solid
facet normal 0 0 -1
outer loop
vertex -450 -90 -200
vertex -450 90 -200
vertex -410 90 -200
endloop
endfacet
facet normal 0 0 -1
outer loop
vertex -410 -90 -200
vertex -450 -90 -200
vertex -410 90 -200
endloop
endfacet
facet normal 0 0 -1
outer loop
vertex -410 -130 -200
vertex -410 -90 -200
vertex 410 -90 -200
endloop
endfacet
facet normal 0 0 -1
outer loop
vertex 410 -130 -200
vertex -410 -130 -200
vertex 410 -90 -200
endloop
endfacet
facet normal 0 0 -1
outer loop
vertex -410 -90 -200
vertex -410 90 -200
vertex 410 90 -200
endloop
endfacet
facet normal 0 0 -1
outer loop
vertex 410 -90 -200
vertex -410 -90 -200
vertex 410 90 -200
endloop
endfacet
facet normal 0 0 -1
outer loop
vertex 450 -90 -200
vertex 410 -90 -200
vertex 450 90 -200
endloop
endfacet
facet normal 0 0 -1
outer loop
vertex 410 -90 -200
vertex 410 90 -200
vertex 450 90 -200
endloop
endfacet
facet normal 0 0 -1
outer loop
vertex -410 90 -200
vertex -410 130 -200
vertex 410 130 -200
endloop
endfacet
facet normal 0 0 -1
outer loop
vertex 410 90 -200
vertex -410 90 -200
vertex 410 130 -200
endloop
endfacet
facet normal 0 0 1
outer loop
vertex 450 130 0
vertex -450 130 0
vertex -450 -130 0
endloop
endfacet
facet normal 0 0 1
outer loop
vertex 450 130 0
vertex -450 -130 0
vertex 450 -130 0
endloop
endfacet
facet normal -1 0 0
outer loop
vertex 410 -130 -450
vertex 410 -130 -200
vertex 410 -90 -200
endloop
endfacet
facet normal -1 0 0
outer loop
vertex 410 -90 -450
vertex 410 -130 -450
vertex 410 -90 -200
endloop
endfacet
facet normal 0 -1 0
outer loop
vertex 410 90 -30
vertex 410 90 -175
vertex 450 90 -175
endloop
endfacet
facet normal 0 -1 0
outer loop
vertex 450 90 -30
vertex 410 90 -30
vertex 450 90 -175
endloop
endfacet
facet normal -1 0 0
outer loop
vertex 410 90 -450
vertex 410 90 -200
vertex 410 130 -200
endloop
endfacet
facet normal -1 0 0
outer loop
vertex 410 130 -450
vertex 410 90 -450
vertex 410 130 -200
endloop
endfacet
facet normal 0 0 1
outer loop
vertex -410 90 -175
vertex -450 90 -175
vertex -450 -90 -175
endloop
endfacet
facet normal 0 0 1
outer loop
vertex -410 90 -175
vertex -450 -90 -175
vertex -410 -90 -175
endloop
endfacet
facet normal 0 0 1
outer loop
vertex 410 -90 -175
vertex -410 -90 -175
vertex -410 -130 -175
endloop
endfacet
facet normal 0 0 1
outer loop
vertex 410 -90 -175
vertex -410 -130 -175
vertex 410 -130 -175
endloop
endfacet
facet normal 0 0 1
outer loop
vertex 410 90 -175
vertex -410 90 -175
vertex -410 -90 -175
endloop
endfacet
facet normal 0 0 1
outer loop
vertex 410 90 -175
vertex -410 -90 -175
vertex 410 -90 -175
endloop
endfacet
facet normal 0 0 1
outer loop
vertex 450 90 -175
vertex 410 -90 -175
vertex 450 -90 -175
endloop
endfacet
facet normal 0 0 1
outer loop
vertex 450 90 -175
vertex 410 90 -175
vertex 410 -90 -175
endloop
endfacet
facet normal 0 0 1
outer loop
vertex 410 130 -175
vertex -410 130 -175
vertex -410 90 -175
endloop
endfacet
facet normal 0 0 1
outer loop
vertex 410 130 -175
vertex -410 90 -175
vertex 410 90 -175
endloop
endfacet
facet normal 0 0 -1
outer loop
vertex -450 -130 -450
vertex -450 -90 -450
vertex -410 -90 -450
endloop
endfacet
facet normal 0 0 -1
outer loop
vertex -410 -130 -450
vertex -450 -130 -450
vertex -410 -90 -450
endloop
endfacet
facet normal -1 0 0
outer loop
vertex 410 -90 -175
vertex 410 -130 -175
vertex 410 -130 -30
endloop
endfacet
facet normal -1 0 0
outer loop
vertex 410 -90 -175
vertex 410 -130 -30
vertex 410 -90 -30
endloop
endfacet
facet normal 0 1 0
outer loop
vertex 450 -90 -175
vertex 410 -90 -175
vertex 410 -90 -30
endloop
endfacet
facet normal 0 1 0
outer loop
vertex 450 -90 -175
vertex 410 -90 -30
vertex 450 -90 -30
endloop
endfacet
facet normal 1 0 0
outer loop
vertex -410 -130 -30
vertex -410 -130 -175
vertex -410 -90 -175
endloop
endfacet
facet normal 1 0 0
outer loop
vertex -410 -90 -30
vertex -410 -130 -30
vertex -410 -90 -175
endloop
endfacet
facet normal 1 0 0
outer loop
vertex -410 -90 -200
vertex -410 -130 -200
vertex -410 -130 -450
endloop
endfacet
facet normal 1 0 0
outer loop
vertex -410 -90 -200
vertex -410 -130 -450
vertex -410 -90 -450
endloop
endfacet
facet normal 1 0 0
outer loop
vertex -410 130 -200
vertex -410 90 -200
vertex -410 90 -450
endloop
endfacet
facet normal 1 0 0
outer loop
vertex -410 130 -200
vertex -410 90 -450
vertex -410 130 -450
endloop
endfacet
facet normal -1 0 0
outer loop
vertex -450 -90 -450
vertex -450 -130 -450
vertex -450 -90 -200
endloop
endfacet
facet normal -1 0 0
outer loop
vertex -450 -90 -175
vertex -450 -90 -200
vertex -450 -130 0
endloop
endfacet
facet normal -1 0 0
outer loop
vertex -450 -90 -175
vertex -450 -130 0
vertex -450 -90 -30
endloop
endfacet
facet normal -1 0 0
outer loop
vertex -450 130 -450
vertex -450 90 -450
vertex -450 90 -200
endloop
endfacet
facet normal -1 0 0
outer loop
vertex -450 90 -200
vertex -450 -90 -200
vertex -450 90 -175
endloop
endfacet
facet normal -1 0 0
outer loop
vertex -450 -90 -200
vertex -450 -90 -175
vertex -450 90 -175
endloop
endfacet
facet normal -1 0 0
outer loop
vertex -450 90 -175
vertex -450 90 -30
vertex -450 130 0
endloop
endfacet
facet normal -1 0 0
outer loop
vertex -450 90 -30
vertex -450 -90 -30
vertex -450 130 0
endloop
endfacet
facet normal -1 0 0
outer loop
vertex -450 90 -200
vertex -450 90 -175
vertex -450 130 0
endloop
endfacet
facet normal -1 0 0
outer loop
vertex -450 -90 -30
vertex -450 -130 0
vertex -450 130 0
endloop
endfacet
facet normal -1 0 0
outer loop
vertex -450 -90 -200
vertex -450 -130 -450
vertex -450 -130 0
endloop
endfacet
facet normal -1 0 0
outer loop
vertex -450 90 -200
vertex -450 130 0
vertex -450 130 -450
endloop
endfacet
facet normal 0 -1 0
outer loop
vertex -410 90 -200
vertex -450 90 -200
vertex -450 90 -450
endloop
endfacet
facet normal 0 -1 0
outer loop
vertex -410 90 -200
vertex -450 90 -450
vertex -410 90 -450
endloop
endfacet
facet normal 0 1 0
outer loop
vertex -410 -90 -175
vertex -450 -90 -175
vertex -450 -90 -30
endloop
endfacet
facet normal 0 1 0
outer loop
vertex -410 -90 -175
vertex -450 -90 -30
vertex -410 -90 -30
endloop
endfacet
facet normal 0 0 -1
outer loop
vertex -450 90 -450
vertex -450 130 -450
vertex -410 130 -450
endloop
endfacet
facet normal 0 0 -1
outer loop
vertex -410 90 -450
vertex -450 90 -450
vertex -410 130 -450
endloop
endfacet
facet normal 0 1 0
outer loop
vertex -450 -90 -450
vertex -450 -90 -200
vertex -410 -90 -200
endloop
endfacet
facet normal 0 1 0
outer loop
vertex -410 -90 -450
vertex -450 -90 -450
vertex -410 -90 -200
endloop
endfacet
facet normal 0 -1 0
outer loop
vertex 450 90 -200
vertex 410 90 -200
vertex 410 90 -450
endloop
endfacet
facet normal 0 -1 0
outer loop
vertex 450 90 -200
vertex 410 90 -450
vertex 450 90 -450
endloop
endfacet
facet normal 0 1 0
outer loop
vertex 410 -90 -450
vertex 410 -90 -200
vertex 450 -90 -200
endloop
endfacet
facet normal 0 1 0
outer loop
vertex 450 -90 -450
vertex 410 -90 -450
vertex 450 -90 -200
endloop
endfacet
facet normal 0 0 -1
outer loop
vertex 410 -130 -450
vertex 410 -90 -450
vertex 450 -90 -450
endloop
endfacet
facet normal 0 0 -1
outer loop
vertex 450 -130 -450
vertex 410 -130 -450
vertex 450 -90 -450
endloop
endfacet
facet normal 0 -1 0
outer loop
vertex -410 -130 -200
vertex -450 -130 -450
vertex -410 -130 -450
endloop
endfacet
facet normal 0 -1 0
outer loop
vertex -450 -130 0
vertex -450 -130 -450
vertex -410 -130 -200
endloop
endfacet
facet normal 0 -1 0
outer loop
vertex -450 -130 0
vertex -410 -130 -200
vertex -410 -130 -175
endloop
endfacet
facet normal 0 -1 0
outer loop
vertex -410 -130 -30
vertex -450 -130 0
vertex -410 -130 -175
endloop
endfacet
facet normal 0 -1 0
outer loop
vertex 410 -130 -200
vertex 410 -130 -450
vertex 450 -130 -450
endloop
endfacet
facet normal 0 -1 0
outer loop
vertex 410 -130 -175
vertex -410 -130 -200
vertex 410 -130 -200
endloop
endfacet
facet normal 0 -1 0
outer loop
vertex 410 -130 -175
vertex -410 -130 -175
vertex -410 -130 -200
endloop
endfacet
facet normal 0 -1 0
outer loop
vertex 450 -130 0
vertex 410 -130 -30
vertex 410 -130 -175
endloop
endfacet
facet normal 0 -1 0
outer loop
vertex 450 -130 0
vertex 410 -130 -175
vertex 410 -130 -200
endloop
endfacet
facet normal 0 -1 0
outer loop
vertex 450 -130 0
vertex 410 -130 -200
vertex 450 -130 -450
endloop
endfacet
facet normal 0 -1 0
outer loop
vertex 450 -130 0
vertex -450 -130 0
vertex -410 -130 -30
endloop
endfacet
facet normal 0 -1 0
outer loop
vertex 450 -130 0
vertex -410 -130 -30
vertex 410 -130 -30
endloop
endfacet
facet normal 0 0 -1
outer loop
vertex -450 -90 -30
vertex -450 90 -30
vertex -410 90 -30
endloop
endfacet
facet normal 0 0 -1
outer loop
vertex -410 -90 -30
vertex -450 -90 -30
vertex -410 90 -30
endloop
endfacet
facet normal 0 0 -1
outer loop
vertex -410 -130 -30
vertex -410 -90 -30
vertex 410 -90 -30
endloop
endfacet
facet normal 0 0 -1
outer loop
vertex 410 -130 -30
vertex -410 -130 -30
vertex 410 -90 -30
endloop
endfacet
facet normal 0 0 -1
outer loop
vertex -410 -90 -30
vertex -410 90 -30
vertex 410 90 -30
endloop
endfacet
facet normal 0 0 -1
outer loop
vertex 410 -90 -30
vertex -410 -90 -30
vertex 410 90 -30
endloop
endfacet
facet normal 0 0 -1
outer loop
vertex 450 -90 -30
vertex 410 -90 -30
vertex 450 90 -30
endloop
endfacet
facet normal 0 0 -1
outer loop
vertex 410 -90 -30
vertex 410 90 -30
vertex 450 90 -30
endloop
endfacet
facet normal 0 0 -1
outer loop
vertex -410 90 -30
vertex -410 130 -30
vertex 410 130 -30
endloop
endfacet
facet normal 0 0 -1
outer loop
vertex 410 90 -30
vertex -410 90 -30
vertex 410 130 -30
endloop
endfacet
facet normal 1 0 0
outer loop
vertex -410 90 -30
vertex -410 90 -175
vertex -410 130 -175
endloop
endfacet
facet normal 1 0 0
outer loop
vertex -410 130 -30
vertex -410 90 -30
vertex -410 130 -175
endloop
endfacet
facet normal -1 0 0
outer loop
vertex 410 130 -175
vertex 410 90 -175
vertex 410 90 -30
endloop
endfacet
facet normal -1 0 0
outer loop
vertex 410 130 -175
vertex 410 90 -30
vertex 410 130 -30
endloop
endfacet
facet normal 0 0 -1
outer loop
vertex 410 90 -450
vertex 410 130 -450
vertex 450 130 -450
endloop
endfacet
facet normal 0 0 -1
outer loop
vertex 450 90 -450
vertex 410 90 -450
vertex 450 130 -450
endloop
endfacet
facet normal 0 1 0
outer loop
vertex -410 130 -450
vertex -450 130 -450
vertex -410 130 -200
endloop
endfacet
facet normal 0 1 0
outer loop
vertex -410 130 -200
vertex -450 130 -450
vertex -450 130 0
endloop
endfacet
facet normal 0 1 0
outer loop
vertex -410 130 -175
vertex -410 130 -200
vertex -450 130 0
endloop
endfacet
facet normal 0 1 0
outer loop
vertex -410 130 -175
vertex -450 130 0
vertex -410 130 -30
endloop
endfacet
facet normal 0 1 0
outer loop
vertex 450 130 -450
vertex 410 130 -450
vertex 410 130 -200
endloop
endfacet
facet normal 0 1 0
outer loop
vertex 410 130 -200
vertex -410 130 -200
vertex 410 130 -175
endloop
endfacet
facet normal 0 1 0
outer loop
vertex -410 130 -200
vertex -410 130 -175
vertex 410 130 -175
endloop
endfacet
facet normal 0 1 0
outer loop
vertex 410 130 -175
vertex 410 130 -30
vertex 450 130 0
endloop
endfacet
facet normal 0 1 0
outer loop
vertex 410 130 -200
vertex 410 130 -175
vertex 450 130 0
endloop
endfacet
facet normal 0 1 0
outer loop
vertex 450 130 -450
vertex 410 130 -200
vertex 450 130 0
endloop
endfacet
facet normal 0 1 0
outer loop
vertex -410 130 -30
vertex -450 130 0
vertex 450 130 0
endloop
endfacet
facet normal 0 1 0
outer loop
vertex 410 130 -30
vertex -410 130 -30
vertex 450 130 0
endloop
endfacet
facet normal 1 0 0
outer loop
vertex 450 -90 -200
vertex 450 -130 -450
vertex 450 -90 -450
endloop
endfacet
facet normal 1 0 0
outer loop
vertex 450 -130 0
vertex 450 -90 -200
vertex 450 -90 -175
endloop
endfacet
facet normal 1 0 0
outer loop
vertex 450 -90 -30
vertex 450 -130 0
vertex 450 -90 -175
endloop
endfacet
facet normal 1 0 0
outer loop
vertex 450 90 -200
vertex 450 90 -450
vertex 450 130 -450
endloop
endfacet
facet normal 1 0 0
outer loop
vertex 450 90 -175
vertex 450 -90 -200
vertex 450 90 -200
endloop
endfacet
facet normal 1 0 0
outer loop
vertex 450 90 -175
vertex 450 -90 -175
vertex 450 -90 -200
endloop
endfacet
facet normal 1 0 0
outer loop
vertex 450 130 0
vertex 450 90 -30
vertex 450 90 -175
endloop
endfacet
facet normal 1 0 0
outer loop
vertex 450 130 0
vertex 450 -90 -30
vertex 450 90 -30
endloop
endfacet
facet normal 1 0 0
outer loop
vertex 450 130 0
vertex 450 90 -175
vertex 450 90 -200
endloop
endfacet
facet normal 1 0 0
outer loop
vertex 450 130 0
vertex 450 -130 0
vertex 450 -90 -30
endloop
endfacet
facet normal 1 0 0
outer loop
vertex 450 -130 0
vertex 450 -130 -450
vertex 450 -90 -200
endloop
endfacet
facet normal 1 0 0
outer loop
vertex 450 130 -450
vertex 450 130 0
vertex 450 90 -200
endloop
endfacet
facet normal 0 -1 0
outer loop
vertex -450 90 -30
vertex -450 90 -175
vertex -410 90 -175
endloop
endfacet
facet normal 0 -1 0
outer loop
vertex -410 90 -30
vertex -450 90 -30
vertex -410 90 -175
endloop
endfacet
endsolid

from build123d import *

# Parameters (mm, degrees)
F0_W     = 900
F0_H     = 260
F1_DEPTH = 30
F2_W     = 40
F2_H     = 40
F3_DEPTH = 450
F5_W     = 900
F5_H     = 260
F6_DEPTH = 25


with BuildPart() as f1:
    # F0 (on Top) → F1 (new body)
    with BuildSketch(Plane.XY):
        Rectangle(F0_W, F0_H)
    extrude(amount=-F1_DEPTH)

    # F2 (on Top) → F3 (join)
    with BuildSketch(Plane.XY):
        with Locations((430, 110)):
            Rectangle(F2_W, F2_H)
        with Locations((-430, 110)):
            Rectangle(F2_W, F2_H)
        with Locations((-430, -110)):
            Rectangle(F2_W, F2_H)
        with Locations((430, -110)):
            Rectangle(F2_W, F2_H)
    extrude(amount=-F3_DEPTH)

    # F5 (on offset) → F6 (join)
    with BuildSketch(Plane.XY.offset(-200)):
        Rectangle(F5_W, F5_H)
    extrude(amount=F6_DEPTH)


solid = f1.part
